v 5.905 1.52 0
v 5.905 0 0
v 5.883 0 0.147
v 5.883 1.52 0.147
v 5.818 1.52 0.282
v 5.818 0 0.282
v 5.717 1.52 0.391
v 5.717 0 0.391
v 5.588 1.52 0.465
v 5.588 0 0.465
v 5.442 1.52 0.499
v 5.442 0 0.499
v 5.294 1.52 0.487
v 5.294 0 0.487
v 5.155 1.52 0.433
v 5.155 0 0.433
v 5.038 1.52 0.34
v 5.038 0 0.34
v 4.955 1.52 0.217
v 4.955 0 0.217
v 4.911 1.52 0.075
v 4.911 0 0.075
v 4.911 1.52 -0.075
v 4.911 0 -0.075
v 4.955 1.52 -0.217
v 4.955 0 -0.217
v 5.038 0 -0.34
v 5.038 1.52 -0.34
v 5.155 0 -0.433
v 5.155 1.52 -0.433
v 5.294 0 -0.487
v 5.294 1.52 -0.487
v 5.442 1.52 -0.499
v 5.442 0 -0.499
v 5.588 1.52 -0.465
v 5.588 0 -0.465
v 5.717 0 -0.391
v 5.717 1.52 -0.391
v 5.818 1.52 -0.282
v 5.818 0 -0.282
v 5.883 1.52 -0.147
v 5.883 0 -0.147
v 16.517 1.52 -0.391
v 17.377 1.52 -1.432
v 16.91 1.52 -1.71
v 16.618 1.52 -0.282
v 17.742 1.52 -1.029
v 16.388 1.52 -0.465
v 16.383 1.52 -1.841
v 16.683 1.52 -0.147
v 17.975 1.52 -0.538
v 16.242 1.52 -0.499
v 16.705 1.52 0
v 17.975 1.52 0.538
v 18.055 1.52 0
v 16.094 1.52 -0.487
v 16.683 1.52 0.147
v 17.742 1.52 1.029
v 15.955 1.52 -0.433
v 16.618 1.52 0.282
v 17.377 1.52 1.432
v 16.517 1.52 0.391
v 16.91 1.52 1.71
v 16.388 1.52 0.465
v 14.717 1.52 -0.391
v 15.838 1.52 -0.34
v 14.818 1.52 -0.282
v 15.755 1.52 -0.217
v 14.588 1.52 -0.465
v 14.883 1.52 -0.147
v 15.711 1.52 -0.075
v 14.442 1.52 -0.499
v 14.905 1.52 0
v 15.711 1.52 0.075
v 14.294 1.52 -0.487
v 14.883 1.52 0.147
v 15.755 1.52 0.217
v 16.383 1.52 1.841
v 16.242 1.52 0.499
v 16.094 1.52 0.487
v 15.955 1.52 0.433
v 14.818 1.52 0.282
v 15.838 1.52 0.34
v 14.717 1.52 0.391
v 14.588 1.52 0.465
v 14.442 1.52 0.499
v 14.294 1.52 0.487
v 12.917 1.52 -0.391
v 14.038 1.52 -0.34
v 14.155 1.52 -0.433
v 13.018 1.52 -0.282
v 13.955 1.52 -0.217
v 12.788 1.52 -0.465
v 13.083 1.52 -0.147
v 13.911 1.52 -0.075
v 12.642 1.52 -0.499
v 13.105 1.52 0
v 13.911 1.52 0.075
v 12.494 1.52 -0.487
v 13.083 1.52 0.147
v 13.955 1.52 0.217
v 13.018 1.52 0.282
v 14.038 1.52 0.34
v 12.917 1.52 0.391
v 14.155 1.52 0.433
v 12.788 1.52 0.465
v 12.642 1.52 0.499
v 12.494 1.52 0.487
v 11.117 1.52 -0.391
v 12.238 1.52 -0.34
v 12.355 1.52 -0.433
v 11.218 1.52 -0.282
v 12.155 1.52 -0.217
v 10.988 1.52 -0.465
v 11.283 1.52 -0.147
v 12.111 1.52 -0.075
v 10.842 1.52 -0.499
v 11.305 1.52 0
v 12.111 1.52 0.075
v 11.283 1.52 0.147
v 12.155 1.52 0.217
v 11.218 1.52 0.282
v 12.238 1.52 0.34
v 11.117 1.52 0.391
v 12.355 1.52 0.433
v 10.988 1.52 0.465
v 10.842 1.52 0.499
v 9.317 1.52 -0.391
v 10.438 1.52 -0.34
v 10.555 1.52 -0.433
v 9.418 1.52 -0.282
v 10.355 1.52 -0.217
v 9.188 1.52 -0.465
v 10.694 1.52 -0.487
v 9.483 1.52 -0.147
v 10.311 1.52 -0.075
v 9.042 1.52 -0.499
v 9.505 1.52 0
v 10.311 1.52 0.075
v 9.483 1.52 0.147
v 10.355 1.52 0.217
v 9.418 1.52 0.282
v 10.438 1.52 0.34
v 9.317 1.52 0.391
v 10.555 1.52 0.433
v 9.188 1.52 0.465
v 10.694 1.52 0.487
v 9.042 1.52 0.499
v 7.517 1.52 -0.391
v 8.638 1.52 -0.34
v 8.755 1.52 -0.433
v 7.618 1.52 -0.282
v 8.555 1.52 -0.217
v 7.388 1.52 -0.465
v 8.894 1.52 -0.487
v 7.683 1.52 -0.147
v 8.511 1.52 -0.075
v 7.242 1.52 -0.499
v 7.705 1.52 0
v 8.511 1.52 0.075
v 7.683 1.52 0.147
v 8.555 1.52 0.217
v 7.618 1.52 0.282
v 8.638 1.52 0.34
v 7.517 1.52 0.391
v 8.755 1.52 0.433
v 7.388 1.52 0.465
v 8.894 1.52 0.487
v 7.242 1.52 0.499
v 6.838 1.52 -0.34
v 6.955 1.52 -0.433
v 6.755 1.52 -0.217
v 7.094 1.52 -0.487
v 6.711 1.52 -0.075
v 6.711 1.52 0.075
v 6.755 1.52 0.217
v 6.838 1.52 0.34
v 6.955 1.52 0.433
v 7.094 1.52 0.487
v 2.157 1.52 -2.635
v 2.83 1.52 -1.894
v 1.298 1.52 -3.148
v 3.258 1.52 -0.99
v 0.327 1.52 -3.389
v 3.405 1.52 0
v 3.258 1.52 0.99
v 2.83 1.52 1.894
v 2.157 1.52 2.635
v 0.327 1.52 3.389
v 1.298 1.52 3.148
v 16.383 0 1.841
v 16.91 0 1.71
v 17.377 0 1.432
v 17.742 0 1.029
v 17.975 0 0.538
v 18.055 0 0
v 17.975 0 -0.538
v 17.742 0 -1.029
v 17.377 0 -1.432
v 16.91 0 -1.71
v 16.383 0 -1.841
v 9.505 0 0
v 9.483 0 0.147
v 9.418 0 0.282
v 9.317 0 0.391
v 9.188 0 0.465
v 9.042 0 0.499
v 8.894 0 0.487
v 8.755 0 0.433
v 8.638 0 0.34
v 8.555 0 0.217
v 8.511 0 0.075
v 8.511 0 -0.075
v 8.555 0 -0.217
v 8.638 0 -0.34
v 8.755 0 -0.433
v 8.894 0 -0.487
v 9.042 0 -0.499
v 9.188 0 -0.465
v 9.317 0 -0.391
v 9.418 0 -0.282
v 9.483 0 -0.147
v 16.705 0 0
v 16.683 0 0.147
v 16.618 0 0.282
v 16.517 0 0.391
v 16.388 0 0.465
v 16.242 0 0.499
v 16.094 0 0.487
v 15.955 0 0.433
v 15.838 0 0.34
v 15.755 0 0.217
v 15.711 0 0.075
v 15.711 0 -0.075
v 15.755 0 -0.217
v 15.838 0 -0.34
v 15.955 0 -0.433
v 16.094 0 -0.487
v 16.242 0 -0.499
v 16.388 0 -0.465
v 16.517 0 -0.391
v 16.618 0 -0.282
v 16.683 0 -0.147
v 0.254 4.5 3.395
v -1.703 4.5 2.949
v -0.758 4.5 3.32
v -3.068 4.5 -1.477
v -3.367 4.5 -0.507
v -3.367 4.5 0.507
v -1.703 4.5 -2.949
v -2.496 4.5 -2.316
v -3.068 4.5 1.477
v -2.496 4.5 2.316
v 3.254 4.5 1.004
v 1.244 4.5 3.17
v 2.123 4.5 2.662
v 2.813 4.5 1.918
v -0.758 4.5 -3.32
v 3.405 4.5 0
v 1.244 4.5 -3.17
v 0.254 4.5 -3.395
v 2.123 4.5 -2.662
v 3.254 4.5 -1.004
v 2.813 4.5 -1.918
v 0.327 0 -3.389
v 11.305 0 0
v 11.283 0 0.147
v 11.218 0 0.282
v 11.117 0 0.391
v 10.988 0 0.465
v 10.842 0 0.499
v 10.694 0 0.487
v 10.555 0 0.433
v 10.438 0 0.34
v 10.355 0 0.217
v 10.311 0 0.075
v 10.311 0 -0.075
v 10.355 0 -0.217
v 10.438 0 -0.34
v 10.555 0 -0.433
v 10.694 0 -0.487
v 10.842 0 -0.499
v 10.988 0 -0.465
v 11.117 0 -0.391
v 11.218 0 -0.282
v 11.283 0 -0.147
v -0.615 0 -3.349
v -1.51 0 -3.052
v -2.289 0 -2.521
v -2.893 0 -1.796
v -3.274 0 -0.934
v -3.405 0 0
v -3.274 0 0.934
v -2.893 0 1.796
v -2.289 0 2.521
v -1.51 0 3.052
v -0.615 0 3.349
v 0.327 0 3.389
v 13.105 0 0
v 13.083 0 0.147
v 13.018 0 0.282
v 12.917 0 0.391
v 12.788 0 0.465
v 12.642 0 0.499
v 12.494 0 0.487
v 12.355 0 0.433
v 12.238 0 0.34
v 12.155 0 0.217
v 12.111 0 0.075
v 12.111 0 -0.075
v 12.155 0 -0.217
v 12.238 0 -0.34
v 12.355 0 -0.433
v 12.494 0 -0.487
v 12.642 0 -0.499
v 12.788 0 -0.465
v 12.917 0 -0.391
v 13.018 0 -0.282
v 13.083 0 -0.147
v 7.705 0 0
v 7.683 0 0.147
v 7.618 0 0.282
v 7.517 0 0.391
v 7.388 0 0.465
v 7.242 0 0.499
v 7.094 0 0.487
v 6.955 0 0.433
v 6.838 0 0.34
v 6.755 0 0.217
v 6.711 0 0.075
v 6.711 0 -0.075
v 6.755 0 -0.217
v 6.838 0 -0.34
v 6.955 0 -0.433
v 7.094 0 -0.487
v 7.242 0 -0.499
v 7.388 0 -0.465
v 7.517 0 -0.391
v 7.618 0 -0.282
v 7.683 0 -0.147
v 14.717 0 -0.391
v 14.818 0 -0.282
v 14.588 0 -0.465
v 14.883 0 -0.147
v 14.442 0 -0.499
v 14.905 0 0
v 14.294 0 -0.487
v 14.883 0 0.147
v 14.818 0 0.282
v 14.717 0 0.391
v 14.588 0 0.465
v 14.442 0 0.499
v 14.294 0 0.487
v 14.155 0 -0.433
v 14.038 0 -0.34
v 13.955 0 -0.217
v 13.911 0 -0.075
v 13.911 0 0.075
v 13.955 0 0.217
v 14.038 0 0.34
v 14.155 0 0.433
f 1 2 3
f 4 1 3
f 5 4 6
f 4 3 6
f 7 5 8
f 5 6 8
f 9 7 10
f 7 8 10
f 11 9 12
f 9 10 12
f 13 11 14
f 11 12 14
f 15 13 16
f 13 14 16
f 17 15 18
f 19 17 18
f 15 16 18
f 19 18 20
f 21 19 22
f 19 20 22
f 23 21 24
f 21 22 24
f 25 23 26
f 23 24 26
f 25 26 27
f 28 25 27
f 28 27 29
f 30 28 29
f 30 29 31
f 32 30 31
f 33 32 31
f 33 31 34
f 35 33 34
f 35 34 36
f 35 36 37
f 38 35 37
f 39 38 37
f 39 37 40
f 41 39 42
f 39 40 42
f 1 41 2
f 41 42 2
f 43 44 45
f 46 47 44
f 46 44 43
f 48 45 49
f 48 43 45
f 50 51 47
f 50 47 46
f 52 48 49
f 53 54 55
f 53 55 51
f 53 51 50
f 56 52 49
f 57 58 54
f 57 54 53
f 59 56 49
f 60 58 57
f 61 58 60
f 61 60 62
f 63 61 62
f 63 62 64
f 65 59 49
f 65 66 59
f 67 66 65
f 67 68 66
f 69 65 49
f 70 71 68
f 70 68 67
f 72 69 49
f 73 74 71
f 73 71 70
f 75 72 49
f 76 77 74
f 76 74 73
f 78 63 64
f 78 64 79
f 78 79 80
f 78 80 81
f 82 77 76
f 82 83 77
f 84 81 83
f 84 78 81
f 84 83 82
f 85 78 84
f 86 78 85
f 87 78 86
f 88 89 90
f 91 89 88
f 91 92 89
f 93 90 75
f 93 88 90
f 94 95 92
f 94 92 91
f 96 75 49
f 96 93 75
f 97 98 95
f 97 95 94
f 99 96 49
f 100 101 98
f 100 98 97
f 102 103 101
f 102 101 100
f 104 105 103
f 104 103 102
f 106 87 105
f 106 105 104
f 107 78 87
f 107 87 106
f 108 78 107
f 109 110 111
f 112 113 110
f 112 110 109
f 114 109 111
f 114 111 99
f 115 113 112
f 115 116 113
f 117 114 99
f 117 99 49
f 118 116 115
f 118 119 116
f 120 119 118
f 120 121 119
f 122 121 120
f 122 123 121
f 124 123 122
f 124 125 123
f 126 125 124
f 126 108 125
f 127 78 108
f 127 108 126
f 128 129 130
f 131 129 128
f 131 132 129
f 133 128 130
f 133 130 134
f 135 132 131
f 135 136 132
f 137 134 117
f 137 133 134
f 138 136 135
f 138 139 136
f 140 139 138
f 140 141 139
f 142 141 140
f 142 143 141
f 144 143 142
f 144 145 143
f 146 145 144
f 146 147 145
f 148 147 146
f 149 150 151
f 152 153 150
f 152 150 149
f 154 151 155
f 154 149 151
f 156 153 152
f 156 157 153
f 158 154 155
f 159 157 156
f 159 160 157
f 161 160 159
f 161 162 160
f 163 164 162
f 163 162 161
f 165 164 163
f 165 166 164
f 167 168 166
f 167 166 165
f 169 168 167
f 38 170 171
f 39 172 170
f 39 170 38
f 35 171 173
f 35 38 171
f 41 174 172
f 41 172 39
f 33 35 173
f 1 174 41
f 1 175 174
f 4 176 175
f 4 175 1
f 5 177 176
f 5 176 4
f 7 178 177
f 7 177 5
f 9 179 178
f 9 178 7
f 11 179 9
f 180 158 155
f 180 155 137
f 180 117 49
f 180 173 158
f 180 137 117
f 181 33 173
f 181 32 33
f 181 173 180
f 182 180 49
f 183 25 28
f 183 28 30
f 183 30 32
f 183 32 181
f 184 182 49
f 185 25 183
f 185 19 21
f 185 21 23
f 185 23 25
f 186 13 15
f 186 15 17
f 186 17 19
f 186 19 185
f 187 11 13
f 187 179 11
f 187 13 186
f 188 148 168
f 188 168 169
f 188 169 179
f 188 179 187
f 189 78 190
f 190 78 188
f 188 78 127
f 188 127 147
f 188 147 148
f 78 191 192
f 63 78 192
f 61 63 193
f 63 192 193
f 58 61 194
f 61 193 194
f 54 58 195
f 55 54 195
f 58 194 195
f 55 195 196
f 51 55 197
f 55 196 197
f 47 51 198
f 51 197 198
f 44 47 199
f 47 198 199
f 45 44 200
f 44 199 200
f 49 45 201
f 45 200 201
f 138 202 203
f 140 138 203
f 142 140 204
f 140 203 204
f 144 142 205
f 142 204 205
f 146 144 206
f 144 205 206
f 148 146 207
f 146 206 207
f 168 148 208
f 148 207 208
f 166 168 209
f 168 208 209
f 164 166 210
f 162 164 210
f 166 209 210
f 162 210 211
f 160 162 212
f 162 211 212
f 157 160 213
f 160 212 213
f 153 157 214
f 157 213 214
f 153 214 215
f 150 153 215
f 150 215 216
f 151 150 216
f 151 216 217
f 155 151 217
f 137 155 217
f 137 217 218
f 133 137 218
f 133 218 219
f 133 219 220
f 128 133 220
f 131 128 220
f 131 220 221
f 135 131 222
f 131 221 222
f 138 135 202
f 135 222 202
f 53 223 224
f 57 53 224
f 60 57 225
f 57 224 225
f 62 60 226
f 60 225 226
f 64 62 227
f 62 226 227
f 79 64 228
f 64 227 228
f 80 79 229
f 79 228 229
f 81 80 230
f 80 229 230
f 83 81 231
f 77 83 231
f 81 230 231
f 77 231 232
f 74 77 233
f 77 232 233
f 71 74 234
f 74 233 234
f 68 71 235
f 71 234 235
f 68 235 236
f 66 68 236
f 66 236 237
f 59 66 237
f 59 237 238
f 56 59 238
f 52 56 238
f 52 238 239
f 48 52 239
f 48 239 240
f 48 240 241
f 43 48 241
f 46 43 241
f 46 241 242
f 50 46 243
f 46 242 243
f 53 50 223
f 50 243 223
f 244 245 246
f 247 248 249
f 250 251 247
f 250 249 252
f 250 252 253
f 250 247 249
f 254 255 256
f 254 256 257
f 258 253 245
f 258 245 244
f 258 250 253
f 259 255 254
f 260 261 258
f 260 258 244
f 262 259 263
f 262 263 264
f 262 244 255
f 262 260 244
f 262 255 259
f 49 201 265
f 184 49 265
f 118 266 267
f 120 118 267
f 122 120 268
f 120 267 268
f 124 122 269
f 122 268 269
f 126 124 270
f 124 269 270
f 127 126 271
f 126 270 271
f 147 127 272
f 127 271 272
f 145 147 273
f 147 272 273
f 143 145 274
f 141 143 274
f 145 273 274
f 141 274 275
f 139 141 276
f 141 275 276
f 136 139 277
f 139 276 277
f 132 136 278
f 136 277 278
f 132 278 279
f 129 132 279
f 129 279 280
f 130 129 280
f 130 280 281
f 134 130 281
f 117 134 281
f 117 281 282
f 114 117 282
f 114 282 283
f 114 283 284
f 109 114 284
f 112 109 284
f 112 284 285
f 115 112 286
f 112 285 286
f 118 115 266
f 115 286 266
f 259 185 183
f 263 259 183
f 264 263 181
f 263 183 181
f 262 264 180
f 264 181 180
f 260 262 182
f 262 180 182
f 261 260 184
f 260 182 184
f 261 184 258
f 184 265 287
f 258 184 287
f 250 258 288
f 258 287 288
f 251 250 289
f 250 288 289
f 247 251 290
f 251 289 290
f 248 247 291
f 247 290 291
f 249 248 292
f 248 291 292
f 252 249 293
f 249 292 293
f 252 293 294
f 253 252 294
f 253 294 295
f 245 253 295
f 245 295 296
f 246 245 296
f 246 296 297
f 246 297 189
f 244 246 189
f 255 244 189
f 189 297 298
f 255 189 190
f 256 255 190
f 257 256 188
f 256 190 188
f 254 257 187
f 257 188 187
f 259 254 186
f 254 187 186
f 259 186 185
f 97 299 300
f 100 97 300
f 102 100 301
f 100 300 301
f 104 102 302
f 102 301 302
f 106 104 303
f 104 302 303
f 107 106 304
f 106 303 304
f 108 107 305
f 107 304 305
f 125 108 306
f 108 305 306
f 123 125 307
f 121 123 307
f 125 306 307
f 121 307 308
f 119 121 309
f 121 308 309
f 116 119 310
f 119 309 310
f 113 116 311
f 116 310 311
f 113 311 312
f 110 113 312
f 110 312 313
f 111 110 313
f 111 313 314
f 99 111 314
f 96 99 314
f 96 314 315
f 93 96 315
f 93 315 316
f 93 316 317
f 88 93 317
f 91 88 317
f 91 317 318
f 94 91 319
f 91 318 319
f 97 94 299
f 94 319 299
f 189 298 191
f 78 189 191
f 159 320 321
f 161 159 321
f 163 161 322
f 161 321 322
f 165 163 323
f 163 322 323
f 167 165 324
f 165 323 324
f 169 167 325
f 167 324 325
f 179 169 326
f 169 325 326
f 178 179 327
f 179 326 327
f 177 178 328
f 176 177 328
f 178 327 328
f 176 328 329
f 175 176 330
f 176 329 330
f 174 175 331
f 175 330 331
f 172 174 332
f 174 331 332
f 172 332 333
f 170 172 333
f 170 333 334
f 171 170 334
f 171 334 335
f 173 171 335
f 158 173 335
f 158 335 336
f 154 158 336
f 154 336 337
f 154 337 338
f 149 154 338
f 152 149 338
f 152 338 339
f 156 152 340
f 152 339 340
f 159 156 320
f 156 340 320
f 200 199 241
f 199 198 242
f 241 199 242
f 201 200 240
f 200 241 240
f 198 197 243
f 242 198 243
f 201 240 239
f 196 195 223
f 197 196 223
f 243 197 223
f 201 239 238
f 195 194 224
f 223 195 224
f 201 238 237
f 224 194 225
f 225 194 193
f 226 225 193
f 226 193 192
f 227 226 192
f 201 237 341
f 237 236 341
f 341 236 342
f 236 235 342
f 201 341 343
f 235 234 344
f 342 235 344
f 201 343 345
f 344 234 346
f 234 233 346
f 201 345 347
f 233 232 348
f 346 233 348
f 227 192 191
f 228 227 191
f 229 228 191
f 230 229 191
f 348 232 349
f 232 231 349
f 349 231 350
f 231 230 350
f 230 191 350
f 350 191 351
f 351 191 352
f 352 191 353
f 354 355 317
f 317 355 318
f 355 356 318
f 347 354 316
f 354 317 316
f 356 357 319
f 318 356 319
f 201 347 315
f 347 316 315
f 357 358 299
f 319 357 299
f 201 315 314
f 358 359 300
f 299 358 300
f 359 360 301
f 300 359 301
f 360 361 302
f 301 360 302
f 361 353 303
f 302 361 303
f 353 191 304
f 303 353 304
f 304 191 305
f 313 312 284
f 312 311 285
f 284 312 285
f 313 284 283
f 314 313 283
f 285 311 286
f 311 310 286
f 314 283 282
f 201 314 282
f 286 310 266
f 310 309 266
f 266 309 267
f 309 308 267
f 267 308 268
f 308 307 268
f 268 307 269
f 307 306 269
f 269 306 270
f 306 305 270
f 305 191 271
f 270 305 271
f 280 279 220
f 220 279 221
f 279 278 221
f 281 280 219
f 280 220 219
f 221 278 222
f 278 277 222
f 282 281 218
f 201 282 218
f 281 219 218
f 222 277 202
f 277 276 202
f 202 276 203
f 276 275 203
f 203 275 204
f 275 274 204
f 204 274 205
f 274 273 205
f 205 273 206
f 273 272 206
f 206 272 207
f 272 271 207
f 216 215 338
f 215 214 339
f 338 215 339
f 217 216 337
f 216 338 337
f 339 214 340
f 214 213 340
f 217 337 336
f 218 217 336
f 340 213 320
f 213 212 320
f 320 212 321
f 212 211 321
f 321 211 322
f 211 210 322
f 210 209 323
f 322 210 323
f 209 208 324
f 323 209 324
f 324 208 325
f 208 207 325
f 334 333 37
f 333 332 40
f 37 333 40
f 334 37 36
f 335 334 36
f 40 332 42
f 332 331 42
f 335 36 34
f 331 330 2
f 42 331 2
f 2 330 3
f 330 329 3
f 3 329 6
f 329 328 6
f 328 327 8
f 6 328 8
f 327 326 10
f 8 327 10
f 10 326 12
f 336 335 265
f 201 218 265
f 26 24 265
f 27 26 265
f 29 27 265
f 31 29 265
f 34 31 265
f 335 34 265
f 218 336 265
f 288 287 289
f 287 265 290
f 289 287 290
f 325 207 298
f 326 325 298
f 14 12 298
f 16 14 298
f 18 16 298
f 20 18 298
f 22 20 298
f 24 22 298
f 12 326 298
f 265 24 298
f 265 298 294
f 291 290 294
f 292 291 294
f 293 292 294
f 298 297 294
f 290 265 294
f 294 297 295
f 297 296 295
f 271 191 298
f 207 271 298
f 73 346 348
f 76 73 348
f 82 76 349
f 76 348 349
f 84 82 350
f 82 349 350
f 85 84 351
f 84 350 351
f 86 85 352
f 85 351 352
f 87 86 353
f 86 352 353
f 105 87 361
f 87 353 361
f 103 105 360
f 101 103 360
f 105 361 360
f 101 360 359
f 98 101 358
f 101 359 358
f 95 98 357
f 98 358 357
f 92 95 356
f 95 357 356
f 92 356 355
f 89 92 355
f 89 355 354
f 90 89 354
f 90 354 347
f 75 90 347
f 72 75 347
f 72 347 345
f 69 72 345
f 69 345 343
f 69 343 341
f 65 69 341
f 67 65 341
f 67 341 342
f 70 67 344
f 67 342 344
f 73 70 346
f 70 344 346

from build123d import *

# Parameters (mm, degrees)
SKETCH_1_R          = 3.405
EXTRUDE_1_DEPTH     = 4.5
EXTRUDE_2_DEPTH     = 1.52
SKETCH_3_R          = 0.5
CUT_EXTRUDE_1_DEPTH = 1.52


with BuildPart() as part:
    # 草图1 → 凸台-拉伸1 (new body)
    with BuildSketch(Plane(origin=(0, 0, 0), x_dir=(1, 0, 0), z_dir=(0, 1, 0))):
        Circle(SKETCH_1_R)
    extrude(amount=EXTRUDE_1_DEPTH)

    # 草图2 → 凸台-拉伸2 (add)
    with BuildSketch(Plane.XZ):
        with BuildLine():
            Line((0.326737118, 3.389287219), (16.38252237, 1.841462953))
            ThreePointArc((16.38252237, 1.841462953), (18.055, 0), (16.38252237, -1.841462953))
            Line((16.38252237, -1.841462953), (0.326737118, -3.389287219))
            ThreePointArc((0.326737118, -3.389287219), (-3.405, 0), (0.326737118, 3.389287219))
        make_face()
    extrude(amount=-EXTRUDE_2_DEPTH)

    # 草图3 → 切除-拉伸1 (cut)
    with BuildSketch(Plane.XZ):
        with Locations((16.205, 0)):
            Circle(SKETCH_3_R)
        with Locations((14.405, 0)):
            Circle(SKETCH_3_R)
        with Locations((12.605, 0)):
            Circle(SKETCH_3_R)
        with Locations((10.805, 0)):
            Circle(SKETCH_3_R)
        with Locations((9.005, 0)):
            Circle(SKETCH_3_R)
        with Locations((7.205, 0)):
            Circle(SKETCH_3_R)
        with Locations((5.405, 0)):
            Circle(SKETCH_3_R)
    extrude(amount=-CUT_EXTRUDE_1_DEPTH, mode=Mode.SUBTRACT)


solid = part.part
